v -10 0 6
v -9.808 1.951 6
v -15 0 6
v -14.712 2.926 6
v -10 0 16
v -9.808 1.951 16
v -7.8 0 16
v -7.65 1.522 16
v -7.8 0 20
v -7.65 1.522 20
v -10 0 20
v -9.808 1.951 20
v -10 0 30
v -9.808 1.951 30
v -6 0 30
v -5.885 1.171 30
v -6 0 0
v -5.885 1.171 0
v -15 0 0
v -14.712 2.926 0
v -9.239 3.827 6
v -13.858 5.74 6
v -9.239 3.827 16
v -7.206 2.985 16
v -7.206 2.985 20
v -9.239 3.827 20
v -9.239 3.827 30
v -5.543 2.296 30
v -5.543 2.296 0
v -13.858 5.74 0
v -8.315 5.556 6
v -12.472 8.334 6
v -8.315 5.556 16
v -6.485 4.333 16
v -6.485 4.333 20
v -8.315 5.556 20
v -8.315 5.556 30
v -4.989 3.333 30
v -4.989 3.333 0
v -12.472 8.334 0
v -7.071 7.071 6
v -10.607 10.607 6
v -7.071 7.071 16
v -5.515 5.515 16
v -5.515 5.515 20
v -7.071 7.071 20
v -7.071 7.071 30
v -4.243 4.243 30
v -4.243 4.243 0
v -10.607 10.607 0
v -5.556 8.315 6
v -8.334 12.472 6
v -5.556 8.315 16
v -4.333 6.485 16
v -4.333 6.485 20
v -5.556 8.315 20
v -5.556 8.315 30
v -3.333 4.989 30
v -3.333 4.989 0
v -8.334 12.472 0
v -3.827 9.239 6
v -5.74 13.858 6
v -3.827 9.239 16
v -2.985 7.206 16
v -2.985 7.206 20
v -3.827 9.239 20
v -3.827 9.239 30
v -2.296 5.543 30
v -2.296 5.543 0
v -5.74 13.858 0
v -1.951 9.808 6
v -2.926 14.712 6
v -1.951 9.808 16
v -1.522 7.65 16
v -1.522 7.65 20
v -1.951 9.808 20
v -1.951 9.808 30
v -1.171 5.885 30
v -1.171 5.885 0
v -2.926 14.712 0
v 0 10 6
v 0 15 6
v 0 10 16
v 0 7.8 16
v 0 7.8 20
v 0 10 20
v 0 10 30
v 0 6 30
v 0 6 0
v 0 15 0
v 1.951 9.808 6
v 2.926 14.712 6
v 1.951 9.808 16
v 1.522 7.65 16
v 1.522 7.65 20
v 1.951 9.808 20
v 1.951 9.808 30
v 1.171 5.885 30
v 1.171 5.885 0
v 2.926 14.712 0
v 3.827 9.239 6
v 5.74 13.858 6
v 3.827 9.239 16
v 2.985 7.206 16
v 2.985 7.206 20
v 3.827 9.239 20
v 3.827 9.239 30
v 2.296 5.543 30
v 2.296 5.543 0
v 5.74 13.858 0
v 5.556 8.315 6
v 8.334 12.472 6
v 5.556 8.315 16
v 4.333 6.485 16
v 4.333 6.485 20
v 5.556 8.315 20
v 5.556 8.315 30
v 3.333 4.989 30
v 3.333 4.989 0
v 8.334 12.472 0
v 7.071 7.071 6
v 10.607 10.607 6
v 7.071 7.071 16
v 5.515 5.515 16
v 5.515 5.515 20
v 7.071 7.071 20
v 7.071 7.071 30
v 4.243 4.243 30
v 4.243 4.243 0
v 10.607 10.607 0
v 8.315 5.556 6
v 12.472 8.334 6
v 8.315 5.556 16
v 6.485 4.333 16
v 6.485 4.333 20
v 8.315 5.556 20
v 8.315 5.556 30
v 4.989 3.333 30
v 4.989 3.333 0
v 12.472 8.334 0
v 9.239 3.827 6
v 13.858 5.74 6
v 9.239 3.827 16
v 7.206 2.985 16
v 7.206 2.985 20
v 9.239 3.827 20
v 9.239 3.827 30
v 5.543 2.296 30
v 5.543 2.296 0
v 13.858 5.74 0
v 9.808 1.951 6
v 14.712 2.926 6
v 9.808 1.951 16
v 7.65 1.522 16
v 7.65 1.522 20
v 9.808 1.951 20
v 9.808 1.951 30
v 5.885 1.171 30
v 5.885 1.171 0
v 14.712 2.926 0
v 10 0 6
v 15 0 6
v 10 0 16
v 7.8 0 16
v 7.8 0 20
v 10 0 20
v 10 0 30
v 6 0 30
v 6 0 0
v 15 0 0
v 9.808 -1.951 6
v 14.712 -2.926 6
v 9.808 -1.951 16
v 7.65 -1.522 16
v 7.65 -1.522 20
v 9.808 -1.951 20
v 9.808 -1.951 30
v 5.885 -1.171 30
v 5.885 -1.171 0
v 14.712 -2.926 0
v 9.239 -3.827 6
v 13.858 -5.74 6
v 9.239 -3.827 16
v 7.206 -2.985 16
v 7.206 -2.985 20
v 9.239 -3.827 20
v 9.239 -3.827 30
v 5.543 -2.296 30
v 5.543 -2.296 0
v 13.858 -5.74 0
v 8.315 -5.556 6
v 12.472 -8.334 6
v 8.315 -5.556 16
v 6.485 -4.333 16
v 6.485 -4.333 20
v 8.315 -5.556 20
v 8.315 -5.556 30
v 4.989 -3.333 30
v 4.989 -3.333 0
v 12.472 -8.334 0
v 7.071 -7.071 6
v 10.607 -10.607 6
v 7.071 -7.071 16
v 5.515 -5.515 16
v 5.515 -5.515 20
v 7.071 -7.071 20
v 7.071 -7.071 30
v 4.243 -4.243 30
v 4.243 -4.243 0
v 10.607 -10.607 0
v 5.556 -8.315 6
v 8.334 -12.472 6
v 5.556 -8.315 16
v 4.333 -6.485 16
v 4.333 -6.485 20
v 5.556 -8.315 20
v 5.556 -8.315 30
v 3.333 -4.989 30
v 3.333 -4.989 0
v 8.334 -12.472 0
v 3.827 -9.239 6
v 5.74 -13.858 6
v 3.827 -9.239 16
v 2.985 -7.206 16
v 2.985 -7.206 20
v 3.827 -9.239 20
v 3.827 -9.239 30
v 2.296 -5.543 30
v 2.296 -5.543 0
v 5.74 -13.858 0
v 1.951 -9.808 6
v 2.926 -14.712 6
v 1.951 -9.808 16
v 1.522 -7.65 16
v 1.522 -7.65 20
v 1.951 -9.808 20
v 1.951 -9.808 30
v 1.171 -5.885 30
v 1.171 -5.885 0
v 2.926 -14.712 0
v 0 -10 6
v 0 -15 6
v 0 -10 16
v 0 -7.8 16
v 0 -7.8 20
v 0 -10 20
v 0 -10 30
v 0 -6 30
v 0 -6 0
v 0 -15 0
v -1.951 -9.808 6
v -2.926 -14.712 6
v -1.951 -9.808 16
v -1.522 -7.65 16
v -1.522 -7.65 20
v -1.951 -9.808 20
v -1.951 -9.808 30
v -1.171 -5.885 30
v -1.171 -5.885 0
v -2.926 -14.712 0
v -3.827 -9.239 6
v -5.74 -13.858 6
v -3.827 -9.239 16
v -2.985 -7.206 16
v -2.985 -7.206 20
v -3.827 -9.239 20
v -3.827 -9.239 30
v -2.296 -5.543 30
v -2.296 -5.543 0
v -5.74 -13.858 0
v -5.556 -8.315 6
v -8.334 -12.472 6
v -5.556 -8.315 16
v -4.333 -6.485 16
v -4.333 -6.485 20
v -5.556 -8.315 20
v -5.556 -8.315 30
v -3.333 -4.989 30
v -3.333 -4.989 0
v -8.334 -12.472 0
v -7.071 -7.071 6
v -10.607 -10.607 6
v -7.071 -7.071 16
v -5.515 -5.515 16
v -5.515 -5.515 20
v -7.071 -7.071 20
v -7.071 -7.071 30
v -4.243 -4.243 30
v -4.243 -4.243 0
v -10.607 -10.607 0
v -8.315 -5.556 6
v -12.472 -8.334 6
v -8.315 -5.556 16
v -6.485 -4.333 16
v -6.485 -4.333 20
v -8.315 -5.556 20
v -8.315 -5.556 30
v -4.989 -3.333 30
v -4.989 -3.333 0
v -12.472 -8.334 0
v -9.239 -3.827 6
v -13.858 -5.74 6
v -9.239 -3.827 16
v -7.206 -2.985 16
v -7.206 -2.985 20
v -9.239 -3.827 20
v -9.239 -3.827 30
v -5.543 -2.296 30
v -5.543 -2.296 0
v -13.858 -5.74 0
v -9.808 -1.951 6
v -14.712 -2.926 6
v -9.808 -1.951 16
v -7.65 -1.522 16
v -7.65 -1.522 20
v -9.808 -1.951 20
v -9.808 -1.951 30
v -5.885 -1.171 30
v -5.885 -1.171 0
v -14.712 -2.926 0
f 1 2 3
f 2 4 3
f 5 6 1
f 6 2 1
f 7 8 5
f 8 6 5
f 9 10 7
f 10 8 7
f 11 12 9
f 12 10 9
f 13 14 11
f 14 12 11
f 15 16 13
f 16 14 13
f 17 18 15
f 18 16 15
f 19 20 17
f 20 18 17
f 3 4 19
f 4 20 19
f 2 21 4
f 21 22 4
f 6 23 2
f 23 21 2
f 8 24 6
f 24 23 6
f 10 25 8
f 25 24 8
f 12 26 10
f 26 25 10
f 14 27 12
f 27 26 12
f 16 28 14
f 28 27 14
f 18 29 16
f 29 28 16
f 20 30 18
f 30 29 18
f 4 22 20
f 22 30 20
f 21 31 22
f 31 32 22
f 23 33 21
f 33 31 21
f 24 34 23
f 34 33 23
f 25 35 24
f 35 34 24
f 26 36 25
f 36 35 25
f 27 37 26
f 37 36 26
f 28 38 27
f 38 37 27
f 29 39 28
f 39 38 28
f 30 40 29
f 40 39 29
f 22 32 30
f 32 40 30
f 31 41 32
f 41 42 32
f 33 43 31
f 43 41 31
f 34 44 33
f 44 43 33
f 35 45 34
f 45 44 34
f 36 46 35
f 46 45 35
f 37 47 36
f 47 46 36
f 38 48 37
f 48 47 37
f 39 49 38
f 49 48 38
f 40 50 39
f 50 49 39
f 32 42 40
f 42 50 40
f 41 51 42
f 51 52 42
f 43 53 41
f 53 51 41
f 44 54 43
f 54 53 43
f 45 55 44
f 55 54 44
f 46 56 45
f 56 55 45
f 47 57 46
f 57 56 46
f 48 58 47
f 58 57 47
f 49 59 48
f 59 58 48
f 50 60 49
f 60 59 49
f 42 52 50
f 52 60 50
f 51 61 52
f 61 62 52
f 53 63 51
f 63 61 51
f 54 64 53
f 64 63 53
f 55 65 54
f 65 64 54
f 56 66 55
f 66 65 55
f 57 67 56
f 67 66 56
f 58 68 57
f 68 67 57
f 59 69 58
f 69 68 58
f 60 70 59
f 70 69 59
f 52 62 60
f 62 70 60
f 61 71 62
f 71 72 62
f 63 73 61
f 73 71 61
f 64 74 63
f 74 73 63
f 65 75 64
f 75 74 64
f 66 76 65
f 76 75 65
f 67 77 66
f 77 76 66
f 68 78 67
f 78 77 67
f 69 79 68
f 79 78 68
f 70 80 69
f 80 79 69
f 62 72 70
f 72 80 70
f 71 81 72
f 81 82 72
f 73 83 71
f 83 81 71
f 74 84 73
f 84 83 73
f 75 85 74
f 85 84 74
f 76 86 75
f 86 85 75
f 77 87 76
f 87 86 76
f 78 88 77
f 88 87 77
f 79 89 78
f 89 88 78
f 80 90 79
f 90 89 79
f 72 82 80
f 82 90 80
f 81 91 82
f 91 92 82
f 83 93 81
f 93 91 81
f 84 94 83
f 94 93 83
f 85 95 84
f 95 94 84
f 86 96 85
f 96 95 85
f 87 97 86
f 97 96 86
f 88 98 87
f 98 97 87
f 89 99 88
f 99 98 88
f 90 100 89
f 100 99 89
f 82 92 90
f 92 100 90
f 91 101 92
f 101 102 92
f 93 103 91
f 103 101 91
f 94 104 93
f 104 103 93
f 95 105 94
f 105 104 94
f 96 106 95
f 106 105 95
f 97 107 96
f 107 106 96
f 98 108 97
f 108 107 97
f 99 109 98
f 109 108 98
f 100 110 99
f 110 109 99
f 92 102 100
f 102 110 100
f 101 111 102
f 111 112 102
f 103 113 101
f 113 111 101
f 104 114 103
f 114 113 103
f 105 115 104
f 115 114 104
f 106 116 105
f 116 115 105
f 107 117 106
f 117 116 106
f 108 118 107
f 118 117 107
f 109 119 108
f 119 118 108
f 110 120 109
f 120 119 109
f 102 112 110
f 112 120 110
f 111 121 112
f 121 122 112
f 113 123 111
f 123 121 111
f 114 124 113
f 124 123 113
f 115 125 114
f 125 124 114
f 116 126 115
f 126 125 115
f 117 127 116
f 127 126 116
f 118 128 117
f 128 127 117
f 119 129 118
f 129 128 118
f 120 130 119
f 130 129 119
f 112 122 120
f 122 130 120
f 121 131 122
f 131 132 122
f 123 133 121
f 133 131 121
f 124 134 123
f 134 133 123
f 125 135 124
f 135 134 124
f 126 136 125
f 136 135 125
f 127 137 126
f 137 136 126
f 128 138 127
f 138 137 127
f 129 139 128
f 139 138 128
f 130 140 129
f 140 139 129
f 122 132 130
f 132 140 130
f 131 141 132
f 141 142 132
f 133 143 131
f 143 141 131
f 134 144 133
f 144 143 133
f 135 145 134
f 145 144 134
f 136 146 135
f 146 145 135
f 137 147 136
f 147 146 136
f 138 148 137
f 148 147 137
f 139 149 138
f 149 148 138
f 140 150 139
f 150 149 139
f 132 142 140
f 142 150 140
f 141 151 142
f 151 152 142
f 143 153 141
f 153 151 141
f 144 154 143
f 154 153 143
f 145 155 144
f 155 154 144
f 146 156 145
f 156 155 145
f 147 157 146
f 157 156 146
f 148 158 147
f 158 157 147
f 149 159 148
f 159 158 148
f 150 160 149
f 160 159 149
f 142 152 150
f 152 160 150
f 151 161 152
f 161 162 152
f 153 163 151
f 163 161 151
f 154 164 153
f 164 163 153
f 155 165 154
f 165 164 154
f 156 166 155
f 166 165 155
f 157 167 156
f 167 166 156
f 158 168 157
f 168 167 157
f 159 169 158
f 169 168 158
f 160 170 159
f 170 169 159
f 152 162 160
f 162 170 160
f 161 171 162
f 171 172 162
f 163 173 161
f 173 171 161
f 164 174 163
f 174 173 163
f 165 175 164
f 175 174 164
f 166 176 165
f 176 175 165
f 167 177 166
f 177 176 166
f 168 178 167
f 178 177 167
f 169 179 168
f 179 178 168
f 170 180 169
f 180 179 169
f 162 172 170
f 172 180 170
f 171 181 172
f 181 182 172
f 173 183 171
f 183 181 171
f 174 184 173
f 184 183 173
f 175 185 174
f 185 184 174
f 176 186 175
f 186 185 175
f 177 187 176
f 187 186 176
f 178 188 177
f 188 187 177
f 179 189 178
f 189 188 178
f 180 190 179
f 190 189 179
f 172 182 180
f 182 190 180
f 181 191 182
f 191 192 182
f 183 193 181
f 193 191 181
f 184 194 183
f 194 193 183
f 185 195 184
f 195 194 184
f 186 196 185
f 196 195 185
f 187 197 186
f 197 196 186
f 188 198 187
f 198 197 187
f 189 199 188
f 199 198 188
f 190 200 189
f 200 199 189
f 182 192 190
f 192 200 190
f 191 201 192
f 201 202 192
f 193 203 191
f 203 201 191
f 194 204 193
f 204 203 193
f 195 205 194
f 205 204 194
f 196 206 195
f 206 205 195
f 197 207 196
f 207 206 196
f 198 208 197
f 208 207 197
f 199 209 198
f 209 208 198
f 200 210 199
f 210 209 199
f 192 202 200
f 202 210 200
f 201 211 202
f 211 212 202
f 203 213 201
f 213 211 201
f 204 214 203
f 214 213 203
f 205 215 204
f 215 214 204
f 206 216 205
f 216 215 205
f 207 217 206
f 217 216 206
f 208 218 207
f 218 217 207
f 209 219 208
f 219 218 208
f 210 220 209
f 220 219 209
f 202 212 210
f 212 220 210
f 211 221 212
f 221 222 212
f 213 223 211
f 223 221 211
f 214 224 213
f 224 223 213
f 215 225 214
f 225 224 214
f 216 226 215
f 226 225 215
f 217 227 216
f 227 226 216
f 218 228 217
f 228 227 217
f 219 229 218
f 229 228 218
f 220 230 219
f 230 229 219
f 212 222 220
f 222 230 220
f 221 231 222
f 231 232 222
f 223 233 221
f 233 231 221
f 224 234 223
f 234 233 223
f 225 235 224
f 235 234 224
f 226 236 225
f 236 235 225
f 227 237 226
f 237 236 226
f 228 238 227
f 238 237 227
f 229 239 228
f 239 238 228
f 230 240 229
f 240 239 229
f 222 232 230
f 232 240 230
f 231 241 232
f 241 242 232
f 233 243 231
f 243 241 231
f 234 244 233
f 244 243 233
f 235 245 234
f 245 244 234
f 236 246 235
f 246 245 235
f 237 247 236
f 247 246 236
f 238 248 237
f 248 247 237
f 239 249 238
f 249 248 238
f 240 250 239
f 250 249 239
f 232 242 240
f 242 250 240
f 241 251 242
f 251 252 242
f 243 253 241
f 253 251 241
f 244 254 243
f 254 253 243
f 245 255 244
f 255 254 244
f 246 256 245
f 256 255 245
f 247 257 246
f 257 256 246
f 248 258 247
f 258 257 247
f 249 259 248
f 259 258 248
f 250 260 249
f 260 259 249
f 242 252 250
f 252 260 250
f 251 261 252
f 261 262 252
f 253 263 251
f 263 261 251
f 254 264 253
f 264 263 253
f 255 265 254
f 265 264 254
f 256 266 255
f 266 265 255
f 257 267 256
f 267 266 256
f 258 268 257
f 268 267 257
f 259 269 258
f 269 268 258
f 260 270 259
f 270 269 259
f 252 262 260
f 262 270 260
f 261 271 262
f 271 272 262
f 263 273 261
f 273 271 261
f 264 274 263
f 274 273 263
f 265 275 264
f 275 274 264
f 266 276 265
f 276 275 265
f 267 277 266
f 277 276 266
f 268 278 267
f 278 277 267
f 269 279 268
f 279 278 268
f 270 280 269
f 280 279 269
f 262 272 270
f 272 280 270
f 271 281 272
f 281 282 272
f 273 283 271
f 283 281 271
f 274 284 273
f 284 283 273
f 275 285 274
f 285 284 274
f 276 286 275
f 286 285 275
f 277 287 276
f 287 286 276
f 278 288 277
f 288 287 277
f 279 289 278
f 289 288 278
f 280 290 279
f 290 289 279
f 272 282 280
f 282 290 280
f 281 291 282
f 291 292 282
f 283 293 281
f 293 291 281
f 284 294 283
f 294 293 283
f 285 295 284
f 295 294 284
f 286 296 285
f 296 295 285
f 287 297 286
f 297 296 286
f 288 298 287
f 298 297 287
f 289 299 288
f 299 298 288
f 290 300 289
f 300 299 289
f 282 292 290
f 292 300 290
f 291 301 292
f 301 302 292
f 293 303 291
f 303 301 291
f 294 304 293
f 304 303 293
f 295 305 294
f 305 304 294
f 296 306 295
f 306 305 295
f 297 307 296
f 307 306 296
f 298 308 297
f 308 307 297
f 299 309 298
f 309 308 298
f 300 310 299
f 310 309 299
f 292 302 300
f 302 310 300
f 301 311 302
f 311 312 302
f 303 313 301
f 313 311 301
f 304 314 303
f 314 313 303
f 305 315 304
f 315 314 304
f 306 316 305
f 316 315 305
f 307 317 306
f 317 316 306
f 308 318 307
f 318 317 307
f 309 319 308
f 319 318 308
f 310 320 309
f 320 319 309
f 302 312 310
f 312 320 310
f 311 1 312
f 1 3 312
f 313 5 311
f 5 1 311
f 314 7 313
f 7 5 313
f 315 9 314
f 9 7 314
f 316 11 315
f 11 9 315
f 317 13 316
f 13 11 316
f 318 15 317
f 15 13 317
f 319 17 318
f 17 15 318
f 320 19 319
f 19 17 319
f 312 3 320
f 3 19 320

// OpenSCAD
$fn = 32;

// ----------------------------------------------------------------------
// Grooved revolve: flanged, bore R6
// ----------------------------------------------------------------------

// --- parameters (mm) ---
bore_r = 6;               // bore radius
outer_r = 10;             // outer radius of the body
total_h = 30;             // overall height, Z
wall = 4;                 // radial wall thickness
groove_w = 4;             // groove width
groove_d = 2.2;           // groove depth
grooves = 1;              // number of outer grooves
flange_r = 15;            // flange radius
flange_h = 6;             // flange height

bbox_x = 2 * flange_r;  // full diameter
bore_d = 2 * bore_r;  // bore diameter
body_d = 2 * outer_r;  // body diameter
flange_d = 2 * flange_r;  // flange diameter
revolve_angle = 360;  // full turn around the Z axis

profile = [[6, 0], [10, 0], [15, 0], [15, 6], [10, 6], [10, 16], [7.8, 16], [7.8, 20], [10, 20], [10, 30], [6, 30]];  // primary outline, 11 points, counter clockwise

// --- the one profile operation ---
rotate_extrude(angle = revolve_angle) polygon(points = profile);
